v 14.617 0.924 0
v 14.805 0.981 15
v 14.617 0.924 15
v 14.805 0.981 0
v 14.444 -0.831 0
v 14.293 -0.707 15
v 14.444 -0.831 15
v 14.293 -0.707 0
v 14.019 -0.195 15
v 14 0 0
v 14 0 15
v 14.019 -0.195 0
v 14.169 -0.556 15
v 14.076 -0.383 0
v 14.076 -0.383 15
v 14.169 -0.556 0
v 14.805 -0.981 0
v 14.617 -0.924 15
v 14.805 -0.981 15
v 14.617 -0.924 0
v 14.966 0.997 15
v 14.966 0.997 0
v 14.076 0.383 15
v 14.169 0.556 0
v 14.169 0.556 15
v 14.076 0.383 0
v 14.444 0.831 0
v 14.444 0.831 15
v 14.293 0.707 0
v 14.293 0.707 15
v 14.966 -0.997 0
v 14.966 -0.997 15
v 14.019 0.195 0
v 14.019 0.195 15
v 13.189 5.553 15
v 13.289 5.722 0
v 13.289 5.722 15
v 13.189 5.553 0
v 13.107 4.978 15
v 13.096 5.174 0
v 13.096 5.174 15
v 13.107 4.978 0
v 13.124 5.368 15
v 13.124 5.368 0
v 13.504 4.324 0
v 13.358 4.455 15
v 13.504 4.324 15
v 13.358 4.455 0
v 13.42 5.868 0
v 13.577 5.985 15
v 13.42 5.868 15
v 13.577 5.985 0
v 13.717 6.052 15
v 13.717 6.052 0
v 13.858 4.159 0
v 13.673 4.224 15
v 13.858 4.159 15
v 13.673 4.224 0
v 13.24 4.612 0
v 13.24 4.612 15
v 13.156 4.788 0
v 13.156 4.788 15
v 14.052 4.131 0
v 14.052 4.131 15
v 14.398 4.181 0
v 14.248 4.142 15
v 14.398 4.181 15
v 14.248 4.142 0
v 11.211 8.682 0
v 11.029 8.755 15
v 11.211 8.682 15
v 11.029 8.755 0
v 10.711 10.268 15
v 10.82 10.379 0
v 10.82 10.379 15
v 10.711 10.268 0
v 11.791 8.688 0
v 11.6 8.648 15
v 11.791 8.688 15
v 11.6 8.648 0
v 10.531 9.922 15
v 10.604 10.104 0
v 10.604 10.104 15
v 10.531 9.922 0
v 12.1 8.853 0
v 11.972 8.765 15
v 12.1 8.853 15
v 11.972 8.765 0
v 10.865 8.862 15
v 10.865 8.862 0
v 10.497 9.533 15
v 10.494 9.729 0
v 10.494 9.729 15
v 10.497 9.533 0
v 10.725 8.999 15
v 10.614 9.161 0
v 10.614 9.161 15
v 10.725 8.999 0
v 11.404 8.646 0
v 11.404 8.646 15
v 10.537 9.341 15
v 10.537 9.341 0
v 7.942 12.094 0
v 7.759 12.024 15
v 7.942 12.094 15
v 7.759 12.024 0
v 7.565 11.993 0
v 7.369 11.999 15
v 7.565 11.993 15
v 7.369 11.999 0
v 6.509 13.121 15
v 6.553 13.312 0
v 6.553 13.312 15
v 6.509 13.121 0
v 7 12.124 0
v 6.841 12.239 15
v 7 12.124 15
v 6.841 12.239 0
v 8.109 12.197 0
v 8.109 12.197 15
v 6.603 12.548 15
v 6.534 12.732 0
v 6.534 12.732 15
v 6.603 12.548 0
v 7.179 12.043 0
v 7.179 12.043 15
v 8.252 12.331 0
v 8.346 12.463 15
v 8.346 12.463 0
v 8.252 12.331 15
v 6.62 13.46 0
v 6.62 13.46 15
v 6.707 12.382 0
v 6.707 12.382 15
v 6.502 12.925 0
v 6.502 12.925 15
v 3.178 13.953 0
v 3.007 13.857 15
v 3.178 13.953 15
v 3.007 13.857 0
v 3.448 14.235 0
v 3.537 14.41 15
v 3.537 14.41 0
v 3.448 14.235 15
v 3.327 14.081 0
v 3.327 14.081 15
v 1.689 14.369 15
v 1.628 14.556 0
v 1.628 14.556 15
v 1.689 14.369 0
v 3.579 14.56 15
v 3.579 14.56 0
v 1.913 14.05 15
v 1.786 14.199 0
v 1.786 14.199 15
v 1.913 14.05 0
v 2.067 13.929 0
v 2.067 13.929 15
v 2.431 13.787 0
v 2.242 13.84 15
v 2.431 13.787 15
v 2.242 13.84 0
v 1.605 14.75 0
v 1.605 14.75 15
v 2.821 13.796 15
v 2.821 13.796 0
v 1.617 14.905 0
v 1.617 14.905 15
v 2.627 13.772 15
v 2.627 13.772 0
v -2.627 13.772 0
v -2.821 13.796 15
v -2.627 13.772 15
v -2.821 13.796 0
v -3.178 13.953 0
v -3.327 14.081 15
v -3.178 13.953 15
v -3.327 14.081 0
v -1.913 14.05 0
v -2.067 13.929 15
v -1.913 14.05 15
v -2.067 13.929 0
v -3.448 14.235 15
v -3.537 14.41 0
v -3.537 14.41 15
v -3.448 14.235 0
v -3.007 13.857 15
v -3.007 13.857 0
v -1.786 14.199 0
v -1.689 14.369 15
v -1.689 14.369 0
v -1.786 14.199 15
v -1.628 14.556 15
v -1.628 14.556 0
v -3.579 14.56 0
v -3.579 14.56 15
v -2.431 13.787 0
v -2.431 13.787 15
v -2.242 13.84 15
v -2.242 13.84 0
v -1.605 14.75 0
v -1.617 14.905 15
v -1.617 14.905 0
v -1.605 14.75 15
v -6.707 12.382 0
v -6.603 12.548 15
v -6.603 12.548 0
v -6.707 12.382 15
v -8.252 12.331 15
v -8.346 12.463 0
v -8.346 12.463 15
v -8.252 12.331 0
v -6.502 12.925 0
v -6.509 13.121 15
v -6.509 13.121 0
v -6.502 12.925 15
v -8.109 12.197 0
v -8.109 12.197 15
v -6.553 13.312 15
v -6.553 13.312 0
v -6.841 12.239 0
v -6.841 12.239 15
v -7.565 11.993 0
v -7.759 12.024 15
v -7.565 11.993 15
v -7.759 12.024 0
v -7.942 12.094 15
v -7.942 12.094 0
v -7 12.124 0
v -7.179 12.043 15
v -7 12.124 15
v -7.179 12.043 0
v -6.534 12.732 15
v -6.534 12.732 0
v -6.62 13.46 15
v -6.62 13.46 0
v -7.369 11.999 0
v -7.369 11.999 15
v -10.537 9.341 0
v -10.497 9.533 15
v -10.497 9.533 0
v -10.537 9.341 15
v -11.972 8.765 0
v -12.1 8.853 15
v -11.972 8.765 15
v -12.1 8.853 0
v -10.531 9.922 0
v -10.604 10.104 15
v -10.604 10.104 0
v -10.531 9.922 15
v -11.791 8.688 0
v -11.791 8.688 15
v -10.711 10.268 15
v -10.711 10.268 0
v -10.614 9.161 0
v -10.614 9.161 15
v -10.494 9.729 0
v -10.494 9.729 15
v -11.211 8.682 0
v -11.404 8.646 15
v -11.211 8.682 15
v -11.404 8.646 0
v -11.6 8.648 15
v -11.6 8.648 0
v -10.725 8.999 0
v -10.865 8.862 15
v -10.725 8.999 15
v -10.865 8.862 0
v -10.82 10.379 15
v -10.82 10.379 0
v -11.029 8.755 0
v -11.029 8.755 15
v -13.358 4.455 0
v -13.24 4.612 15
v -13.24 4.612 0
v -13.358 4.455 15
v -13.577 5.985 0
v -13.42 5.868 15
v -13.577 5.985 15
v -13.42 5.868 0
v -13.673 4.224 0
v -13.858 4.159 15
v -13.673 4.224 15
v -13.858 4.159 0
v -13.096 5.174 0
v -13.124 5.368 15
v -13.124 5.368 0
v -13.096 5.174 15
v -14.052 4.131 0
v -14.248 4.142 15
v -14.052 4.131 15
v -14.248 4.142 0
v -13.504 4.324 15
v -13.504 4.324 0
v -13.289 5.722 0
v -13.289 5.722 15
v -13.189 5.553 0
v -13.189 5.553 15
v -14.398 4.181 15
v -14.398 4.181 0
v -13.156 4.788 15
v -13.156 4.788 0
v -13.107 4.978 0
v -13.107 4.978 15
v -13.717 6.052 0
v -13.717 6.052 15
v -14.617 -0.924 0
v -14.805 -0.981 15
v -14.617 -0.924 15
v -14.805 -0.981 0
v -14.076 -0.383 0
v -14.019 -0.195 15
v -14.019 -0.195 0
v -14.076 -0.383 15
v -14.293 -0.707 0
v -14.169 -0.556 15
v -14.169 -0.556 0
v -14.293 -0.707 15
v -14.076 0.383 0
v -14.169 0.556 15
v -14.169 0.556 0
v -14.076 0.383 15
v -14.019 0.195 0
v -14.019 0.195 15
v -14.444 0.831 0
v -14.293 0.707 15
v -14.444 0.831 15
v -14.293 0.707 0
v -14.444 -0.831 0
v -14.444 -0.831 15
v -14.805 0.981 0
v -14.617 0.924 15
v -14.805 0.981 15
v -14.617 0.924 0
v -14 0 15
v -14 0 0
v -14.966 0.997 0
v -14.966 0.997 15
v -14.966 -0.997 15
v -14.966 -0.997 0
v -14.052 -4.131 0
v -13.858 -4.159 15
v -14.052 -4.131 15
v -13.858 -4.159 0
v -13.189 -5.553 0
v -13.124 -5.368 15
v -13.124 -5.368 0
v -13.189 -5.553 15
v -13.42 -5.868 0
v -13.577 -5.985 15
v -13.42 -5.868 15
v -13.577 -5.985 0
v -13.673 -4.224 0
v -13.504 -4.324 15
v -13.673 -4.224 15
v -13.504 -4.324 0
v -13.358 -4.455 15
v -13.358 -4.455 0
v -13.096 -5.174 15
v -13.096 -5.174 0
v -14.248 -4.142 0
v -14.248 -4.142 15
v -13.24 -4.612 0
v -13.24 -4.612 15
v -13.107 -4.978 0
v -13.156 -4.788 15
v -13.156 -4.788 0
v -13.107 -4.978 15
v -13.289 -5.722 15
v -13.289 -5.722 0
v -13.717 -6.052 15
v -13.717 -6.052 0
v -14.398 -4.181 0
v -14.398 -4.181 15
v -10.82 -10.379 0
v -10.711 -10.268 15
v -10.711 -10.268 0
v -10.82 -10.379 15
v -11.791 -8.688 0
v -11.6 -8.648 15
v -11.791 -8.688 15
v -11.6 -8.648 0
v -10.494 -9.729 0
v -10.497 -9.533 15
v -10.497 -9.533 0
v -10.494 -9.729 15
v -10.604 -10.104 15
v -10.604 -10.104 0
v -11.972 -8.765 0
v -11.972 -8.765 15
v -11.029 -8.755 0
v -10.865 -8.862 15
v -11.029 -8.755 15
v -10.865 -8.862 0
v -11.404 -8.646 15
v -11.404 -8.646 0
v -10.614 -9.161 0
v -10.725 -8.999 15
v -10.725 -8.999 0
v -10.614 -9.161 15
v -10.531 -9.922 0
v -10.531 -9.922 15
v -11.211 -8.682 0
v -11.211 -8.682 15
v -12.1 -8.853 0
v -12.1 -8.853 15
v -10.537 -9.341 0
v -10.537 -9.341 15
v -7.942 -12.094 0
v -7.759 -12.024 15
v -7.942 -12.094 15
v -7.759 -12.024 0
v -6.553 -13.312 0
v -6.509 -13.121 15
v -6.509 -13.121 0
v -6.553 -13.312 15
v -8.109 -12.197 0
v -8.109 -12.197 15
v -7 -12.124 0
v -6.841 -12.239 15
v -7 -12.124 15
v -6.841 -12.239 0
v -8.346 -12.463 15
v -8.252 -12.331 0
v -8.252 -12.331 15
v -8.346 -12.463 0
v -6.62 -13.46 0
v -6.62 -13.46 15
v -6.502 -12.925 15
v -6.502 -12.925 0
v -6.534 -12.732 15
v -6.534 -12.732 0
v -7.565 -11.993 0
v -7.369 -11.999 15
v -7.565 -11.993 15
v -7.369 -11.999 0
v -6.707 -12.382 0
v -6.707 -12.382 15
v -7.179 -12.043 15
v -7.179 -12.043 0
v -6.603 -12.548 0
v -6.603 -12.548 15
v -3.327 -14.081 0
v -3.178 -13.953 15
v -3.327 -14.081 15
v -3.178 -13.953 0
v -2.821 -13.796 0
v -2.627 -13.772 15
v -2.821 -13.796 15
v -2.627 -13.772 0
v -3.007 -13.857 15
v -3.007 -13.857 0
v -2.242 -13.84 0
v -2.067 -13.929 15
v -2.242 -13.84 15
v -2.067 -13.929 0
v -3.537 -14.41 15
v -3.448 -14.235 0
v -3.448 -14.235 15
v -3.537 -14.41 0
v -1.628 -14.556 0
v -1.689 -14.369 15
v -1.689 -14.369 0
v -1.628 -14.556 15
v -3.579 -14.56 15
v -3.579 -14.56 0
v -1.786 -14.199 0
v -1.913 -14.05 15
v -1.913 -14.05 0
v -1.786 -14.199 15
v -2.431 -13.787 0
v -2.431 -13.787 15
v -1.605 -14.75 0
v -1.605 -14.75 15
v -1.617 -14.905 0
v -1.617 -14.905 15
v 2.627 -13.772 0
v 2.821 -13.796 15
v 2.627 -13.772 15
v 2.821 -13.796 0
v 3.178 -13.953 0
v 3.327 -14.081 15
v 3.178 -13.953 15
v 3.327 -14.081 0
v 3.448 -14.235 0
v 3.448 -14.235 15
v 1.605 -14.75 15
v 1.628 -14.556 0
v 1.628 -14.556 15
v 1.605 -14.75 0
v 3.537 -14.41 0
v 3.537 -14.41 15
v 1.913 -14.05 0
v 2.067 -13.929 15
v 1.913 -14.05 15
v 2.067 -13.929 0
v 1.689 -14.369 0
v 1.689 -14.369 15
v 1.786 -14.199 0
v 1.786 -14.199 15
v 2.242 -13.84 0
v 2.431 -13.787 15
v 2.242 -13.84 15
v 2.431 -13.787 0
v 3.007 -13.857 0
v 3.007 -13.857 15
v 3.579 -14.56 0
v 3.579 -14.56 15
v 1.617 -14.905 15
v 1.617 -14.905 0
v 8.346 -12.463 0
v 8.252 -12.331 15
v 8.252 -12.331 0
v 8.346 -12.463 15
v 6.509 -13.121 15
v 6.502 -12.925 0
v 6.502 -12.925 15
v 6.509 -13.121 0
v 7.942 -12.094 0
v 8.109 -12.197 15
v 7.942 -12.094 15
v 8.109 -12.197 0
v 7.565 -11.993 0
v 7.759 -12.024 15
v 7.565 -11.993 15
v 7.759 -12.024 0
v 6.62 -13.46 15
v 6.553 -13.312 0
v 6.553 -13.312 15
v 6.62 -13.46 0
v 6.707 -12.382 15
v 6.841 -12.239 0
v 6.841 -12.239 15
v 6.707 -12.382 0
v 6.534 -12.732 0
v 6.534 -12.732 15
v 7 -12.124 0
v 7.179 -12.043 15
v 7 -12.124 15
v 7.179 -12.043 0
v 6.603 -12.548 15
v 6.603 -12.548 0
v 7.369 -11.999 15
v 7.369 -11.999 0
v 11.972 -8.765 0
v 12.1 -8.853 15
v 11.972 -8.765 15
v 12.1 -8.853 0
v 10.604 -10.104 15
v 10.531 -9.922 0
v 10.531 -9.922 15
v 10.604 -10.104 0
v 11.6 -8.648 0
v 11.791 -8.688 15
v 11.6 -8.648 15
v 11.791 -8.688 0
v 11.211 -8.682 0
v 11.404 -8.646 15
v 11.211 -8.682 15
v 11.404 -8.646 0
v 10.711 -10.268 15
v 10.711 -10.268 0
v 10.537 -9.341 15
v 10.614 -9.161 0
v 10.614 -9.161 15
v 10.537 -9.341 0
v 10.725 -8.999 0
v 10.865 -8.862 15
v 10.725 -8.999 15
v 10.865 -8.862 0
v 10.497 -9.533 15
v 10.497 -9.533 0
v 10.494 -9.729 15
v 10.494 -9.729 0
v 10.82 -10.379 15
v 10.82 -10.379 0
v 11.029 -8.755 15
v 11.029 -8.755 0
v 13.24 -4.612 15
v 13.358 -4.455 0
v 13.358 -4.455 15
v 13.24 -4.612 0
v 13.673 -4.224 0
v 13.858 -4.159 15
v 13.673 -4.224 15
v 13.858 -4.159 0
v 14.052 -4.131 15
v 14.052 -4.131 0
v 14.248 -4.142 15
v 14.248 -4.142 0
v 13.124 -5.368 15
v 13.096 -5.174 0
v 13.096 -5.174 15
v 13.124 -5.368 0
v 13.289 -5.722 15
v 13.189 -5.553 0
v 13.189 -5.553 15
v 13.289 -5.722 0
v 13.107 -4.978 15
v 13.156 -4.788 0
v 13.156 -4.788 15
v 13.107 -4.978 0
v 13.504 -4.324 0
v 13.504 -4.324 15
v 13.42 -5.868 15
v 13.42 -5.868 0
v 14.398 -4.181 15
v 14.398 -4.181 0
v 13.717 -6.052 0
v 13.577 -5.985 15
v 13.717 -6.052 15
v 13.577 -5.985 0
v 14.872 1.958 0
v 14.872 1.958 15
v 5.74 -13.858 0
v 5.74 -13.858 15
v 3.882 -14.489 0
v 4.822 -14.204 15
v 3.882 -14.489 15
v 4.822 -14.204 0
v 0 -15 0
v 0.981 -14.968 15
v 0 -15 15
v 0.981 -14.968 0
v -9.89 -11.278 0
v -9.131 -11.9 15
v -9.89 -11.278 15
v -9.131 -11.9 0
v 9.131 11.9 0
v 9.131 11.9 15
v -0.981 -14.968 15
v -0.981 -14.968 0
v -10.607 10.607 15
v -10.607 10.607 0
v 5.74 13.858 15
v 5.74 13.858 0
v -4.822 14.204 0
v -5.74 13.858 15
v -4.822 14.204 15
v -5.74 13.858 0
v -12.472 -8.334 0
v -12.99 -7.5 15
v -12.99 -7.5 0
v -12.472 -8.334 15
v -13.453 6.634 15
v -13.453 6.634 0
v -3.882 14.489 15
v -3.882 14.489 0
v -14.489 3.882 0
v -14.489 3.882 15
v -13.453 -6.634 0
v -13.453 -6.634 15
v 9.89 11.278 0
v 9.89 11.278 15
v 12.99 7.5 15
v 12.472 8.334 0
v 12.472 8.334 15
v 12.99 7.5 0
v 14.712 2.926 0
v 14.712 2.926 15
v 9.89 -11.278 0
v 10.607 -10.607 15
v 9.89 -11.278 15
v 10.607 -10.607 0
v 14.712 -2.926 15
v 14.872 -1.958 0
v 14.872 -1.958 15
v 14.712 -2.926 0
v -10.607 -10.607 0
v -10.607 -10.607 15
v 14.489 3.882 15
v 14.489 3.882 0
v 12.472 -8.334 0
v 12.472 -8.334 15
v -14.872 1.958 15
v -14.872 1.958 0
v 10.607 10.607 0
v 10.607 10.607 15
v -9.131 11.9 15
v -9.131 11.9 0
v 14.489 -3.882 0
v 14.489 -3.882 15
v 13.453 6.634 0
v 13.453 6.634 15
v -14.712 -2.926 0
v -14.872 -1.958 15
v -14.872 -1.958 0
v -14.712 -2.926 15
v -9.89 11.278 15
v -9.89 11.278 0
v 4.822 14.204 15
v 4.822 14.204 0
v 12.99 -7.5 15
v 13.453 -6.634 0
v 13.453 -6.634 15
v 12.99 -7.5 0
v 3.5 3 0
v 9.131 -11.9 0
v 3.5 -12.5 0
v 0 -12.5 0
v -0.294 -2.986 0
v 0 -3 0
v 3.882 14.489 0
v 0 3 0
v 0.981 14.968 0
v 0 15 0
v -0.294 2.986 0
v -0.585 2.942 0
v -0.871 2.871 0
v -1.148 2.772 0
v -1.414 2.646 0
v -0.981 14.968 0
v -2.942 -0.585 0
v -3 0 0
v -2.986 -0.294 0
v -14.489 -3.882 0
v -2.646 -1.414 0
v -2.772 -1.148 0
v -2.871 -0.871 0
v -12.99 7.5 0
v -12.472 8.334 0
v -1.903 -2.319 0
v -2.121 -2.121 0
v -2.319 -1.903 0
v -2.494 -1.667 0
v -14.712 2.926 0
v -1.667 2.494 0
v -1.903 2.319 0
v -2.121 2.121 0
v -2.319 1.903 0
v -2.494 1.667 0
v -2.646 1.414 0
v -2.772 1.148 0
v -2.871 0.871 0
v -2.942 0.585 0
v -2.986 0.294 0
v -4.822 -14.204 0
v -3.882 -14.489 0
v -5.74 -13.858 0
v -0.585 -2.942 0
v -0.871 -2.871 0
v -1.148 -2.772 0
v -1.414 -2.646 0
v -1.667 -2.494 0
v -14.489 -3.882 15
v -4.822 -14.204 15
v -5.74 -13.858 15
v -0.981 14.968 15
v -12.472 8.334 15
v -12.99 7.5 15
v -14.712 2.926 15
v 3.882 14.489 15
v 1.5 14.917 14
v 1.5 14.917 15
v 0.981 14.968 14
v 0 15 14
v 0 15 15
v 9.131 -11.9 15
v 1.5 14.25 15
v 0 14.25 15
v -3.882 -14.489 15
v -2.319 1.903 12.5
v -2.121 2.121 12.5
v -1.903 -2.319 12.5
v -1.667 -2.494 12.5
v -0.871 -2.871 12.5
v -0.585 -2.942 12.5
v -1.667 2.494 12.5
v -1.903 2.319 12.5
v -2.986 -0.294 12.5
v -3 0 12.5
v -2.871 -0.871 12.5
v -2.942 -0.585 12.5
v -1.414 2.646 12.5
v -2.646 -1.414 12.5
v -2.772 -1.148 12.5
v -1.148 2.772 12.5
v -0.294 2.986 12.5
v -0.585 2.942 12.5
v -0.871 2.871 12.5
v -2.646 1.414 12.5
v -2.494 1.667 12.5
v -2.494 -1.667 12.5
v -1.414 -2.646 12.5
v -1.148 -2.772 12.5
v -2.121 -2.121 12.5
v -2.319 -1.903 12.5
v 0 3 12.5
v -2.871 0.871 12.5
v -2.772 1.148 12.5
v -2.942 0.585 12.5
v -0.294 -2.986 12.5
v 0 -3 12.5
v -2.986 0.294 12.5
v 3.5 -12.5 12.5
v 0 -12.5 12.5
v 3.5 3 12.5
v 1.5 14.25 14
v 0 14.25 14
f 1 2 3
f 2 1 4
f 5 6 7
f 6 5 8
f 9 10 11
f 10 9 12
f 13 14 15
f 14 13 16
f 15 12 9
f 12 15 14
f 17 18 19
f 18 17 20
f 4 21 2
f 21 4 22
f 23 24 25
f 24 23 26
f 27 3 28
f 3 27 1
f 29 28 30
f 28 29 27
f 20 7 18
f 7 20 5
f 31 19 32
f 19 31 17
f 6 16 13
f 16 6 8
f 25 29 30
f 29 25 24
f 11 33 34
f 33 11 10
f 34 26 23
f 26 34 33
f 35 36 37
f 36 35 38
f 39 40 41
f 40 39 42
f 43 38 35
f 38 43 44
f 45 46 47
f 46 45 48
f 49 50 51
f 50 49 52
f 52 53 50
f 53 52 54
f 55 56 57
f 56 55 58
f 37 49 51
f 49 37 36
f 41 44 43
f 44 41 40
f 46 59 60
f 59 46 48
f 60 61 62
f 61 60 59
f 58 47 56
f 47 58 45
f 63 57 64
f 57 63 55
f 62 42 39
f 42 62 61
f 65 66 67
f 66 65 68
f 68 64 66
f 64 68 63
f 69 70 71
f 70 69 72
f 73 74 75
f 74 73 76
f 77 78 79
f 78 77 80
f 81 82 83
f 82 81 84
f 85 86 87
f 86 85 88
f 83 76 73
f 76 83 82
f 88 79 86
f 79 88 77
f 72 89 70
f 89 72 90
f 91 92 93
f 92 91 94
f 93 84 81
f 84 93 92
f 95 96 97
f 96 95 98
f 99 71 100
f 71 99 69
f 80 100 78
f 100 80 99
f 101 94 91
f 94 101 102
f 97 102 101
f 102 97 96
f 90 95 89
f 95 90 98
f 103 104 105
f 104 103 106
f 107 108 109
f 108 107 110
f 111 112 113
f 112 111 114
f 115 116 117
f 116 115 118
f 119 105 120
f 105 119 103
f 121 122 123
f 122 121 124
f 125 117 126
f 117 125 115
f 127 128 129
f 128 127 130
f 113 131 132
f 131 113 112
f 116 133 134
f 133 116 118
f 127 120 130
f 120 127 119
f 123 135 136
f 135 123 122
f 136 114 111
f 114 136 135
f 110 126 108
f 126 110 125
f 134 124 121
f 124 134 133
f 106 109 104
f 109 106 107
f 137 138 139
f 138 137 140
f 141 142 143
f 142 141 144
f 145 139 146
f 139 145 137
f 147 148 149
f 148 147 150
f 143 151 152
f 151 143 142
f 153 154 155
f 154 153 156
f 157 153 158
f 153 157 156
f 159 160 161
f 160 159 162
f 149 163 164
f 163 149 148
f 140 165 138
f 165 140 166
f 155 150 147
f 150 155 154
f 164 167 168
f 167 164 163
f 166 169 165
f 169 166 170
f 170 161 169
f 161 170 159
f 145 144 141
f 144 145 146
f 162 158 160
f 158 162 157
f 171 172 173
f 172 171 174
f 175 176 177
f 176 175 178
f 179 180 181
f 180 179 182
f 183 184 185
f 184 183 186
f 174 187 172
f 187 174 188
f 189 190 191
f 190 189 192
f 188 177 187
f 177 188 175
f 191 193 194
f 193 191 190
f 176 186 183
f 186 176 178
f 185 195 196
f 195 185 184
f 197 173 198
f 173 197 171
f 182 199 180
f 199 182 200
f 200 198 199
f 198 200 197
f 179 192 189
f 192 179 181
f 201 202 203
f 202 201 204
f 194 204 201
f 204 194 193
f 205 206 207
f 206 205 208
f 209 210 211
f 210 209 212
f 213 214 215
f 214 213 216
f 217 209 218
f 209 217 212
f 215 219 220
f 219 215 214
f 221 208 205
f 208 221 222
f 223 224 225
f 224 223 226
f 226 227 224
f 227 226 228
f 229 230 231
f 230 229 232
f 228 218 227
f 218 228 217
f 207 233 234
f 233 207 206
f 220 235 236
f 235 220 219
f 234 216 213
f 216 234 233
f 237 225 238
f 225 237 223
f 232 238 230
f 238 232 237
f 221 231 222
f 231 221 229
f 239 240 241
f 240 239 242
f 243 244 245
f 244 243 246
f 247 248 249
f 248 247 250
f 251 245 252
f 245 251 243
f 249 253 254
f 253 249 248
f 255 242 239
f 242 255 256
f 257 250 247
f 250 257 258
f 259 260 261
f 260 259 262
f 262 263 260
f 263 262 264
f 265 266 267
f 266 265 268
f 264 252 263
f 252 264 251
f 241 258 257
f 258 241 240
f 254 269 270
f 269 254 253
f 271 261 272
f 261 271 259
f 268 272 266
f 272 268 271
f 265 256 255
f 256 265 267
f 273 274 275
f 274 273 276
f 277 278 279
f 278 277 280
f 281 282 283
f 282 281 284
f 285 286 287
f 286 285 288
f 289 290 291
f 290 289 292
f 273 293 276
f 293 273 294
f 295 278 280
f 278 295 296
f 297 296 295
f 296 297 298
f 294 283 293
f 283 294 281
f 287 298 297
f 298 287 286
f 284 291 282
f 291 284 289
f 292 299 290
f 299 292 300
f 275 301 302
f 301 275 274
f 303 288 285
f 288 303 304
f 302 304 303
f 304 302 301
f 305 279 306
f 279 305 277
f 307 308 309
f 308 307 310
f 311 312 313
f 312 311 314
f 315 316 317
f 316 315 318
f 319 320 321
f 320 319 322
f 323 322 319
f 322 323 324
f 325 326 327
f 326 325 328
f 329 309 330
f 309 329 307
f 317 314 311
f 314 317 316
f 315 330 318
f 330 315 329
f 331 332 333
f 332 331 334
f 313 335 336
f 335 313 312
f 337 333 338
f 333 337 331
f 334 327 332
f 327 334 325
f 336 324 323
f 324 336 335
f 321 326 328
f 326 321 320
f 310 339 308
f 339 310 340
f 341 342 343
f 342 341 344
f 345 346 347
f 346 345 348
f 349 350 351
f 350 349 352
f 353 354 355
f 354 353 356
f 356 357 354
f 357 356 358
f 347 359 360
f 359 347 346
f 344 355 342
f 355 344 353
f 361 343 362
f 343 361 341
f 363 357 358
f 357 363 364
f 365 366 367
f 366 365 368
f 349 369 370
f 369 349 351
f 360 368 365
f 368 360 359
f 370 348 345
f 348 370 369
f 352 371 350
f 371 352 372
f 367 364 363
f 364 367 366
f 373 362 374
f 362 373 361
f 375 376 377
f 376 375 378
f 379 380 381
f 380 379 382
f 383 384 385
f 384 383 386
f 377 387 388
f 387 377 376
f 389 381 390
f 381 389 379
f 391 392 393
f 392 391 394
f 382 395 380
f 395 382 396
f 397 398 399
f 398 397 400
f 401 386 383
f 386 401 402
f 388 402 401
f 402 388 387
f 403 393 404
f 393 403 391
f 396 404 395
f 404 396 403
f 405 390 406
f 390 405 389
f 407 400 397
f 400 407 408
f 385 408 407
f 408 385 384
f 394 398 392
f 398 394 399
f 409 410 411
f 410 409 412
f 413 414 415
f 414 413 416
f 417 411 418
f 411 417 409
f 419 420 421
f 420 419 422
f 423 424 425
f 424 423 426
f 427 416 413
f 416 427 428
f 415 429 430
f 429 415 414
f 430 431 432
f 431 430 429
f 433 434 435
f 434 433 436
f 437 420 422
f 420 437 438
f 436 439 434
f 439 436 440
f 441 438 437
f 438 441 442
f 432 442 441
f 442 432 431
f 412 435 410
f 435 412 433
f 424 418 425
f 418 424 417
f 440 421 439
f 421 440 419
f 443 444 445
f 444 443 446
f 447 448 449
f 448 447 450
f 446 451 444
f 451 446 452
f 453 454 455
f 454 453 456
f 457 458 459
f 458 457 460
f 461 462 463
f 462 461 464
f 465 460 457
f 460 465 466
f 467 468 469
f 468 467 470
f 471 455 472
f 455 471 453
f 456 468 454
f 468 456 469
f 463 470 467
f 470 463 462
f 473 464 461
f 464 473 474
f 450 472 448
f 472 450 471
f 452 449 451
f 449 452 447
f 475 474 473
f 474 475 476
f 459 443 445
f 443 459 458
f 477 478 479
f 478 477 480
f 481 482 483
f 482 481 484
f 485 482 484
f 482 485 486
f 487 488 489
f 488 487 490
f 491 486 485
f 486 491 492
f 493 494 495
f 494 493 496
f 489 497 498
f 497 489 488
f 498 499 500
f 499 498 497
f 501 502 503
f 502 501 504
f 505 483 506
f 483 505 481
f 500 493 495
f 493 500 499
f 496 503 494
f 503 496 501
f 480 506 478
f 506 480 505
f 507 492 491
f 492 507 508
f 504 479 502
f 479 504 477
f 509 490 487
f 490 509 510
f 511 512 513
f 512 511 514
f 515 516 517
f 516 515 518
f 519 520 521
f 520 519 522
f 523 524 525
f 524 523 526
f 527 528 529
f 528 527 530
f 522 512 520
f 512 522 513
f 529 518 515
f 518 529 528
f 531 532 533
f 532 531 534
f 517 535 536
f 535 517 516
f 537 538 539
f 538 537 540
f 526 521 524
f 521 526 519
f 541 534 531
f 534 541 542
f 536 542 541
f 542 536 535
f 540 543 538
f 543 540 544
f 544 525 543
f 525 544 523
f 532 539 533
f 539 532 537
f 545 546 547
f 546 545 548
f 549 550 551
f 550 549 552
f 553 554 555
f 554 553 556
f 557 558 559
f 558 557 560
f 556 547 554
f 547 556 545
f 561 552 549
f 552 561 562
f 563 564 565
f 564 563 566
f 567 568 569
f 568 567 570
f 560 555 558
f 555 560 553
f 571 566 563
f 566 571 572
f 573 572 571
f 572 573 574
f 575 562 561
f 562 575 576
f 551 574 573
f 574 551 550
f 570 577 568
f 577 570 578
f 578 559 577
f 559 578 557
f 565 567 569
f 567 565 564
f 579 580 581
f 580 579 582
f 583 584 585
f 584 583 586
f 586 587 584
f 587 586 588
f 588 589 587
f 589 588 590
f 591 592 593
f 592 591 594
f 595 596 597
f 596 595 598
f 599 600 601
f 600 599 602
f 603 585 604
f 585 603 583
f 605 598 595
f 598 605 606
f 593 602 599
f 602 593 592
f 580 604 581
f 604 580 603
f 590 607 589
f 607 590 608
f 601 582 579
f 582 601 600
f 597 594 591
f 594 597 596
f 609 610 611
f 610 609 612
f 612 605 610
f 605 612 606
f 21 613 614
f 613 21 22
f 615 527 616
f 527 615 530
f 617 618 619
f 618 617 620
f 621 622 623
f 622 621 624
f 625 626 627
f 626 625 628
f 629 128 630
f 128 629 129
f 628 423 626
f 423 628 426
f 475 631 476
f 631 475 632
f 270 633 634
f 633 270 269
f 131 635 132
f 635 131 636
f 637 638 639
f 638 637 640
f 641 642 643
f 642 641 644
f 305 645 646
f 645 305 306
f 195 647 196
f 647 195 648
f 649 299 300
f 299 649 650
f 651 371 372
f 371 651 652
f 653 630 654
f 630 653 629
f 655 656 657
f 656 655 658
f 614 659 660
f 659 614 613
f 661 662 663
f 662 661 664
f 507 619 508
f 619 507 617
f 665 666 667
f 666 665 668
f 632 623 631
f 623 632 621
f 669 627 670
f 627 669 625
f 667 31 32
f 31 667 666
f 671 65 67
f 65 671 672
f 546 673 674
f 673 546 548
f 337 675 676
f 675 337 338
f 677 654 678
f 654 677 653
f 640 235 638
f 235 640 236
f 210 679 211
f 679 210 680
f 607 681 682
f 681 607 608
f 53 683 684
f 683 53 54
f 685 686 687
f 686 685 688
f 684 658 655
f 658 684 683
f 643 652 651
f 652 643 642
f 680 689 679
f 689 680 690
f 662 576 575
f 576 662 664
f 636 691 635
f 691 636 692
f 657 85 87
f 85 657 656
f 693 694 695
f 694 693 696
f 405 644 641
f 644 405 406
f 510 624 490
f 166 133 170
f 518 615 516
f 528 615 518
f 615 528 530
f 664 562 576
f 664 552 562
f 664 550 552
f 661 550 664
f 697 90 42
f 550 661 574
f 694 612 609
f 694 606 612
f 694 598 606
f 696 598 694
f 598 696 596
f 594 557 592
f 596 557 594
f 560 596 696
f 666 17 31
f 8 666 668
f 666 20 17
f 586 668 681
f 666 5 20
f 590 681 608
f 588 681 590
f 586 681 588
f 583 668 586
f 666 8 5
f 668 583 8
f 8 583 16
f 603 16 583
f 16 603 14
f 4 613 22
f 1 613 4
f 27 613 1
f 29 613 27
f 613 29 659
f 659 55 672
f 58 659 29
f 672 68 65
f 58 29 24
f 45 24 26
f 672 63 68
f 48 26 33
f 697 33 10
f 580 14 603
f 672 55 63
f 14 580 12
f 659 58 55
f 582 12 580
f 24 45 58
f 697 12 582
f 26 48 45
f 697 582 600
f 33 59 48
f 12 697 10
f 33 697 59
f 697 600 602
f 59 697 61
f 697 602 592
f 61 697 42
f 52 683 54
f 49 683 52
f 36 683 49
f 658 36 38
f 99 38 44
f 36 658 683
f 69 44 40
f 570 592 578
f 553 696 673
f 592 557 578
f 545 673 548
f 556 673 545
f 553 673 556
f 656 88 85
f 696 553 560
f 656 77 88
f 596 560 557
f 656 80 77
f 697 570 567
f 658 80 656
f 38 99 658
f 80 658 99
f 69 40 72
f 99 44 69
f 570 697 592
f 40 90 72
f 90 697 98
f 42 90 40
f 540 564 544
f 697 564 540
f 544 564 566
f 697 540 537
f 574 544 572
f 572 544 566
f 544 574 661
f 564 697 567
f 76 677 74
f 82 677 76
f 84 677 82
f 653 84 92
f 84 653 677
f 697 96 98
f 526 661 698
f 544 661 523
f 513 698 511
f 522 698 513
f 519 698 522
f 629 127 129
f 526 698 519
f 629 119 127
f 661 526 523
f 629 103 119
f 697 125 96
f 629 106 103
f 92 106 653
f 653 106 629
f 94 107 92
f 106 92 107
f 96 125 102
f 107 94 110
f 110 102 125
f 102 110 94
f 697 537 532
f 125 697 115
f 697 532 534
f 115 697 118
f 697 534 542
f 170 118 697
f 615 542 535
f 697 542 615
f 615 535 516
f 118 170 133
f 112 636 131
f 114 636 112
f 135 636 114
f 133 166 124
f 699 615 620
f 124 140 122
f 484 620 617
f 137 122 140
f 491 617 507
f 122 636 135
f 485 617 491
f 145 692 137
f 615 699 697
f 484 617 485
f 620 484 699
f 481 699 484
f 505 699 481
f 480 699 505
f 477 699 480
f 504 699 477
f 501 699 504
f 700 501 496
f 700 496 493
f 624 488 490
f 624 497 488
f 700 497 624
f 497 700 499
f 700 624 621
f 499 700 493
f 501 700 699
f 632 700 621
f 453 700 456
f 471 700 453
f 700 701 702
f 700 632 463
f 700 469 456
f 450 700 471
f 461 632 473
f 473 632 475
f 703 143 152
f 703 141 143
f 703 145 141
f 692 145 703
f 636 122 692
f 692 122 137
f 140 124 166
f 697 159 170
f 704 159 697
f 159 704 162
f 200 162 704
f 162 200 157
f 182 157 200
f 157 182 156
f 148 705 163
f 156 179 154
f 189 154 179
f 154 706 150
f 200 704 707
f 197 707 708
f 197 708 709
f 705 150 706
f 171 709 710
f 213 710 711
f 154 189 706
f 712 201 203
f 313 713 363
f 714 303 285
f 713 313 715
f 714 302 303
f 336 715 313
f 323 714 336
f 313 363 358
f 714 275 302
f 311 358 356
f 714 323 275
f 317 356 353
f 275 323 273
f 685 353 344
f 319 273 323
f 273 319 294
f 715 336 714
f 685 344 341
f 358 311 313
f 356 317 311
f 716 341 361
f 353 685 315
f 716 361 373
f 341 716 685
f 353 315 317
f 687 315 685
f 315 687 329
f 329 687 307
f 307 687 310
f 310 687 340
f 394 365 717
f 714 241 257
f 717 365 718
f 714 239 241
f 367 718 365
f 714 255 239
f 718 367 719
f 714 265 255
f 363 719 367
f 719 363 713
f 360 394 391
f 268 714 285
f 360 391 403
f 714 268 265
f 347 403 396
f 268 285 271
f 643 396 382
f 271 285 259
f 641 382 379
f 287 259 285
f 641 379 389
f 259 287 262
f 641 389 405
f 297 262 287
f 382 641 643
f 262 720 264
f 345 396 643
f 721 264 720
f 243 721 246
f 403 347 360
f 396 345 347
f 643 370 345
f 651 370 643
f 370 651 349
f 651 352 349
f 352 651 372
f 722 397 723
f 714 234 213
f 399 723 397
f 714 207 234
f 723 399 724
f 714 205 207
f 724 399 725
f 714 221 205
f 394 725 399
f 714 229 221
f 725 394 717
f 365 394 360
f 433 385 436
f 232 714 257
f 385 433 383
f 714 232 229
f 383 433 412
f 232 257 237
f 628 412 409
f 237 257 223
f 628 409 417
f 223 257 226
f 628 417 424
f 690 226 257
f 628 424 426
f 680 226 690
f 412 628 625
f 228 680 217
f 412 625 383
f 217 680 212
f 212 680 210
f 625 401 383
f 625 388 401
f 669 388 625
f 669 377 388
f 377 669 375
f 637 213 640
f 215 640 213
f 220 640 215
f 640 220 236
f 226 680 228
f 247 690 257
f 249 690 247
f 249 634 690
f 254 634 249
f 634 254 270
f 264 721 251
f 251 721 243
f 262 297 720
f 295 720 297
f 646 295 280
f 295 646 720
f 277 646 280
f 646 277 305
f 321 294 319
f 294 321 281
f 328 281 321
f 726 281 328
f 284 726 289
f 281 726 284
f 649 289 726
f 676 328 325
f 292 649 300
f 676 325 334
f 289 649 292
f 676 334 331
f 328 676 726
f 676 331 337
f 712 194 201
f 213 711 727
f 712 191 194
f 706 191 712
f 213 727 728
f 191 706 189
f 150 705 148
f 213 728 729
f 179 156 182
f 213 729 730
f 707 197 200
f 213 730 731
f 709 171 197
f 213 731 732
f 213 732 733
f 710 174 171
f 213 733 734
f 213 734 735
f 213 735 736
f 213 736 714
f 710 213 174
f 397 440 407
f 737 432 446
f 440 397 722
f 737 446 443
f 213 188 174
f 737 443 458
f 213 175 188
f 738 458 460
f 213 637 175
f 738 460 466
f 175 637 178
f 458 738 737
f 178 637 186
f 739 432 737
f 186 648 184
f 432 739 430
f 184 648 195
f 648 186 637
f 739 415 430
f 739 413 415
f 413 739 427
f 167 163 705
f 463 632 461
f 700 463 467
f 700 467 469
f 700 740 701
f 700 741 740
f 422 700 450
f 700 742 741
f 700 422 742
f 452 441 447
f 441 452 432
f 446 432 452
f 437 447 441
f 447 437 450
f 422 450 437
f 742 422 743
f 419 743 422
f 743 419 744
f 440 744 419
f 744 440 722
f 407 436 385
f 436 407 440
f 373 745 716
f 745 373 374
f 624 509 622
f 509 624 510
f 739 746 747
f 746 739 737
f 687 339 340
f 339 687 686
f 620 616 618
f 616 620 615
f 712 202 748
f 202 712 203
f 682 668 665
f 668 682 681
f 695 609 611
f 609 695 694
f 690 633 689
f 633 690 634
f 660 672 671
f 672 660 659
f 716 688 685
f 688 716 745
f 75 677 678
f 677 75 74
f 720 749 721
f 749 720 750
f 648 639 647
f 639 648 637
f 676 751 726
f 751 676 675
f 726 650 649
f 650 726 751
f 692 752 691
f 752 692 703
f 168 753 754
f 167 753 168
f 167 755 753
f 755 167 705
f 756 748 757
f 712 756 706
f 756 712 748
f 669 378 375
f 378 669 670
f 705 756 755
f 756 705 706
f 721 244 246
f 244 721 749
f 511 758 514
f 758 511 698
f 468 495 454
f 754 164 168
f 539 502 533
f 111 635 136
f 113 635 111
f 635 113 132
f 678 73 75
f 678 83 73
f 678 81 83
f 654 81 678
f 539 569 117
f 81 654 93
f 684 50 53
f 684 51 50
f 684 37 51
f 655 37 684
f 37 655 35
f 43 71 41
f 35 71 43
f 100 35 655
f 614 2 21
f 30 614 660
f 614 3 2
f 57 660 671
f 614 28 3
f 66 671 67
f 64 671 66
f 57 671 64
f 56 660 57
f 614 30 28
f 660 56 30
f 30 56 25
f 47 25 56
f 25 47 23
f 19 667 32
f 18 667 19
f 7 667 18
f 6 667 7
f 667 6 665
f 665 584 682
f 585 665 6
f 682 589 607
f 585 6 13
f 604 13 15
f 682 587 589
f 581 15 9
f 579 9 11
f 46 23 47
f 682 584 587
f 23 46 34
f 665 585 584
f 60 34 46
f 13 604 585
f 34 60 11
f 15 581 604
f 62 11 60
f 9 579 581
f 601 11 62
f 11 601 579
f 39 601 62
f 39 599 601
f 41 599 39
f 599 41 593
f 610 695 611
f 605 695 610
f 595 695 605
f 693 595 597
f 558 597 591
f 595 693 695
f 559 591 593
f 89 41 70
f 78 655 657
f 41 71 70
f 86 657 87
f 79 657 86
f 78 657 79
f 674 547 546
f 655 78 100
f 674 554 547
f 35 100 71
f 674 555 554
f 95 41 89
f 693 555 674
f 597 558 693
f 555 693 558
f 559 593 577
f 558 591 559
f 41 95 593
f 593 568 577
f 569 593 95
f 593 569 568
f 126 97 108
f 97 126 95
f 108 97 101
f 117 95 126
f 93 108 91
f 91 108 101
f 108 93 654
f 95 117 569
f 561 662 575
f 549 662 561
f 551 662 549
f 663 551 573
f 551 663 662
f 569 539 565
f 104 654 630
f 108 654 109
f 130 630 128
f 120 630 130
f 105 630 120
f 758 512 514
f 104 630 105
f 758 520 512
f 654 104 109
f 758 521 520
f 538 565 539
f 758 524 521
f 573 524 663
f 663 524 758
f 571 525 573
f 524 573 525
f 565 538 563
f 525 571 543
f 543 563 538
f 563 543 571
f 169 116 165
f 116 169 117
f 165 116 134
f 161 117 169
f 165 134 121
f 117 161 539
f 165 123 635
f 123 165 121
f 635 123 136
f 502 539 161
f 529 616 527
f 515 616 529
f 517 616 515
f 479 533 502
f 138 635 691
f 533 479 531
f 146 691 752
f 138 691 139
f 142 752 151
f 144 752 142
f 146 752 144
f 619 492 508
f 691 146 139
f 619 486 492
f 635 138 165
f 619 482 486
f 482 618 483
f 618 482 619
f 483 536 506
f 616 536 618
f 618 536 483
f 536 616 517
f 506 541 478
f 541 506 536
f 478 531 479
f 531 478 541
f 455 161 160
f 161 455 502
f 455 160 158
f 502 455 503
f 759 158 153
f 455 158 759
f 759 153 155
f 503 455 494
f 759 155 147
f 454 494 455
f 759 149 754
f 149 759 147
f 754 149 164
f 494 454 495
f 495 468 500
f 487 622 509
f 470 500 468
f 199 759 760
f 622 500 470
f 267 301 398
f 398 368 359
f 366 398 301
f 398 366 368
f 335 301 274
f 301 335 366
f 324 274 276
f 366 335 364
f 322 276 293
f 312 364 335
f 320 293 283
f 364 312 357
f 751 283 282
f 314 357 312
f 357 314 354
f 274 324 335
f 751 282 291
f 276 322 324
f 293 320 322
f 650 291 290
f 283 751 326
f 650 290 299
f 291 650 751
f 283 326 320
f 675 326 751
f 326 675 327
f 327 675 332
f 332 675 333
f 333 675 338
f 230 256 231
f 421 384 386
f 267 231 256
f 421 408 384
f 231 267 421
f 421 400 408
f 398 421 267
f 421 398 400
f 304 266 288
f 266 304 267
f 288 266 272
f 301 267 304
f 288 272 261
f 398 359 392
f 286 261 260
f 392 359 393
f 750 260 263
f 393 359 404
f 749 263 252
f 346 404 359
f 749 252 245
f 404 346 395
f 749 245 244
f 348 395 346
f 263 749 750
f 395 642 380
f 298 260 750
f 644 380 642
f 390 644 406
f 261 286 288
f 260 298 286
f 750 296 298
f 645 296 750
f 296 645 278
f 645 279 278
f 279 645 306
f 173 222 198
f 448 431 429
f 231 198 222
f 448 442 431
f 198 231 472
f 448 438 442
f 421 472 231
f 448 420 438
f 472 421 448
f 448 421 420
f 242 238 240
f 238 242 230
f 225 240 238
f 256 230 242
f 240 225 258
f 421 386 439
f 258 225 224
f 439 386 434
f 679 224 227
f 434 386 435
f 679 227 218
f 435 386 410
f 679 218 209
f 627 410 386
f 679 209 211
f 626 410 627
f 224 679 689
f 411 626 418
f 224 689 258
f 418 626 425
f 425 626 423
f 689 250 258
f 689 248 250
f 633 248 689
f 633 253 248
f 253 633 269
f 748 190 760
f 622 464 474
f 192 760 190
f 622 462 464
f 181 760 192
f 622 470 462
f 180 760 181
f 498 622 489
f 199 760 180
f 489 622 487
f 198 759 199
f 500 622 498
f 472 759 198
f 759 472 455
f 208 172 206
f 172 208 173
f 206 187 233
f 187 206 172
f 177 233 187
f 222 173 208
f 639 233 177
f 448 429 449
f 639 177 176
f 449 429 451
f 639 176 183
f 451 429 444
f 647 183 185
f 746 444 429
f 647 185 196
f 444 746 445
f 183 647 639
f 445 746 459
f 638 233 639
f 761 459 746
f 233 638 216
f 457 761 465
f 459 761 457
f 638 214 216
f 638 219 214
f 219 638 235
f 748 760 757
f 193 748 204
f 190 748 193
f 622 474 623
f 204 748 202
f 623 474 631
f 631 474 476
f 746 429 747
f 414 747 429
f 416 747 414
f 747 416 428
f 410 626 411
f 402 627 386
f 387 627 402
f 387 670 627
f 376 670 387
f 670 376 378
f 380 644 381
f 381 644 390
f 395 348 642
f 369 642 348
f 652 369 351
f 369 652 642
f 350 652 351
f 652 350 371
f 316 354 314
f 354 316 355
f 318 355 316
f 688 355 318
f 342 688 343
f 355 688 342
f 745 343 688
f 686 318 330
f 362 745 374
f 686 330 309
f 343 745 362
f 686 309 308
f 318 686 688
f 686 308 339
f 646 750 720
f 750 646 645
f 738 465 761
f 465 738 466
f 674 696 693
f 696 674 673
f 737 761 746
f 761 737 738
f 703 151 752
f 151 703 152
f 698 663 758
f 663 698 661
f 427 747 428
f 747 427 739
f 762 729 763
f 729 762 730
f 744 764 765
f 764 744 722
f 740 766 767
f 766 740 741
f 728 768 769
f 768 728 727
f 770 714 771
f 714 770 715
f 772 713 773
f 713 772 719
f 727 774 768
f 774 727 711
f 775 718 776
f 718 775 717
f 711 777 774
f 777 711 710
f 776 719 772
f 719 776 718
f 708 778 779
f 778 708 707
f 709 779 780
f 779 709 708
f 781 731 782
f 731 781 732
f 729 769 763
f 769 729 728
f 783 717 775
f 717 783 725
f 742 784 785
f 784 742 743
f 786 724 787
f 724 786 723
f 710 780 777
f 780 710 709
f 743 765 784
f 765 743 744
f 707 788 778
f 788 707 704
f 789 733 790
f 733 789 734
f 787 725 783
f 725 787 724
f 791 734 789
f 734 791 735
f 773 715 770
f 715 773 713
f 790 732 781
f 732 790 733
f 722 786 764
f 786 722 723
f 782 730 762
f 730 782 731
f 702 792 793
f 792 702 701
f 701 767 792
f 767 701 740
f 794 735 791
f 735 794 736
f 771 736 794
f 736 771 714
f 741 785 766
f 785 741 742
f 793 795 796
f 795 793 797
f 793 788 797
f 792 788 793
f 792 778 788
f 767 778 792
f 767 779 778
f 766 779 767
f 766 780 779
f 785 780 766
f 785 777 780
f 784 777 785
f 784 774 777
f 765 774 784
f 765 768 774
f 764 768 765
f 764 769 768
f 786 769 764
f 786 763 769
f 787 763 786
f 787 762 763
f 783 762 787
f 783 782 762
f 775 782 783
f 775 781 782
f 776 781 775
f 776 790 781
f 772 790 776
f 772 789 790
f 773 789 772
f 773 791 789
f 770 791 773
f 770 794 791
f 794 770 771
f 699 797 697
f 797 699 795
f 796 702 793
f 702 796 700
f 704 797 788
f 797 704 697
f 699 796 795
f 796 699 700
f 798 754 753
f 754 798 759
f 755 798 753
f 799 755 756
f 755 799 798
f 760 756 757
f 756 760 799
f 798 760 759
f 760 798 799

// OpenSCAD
// Replacement knob for hotplate stirrer with D-shaft
// Print orientation: flat side of D bore faces the hotplate (z = 0)

// ---------------- Parameters ----------------
knob_d        = 30;    // knob outer diameter
knob_h        = 15;    // knob height
shaft_d       = 6;     // D-bore diameter (shaft clearance)
bore_depth    = 12;    // D-bore depth from bottom face
groove_count  = 18;    // number of vertical grip grooves
groove_d      = 2;     // groove diameter (half-cylinder)
pointer_w     = 1.5;   // pointer groove width
pointer_d     = 1;     // pointer groove depth
eps           = 0.5;   // overcut for clean boolean differences

$fn = 96;

// Derived
outer_r = knob_d / 2;
// Check: distance from flat to opposite side of D = bore_depth - shaft_d/2
// (included for the user's reference: 12 - 3 = 9 mm)

// ---------------- Model ----------------
difference() {
    // Main body
    cylinder(d = knob_d, h = knob_h);

    // D-shaped blind bore from bottom face
    translate([0, 0, -eps])
        cylinder(d = shaft_d, h = bore_depth + 2 * eps, $fn = 64);
    // Flat side of the D, centred on the -Y axis
    translate([0, -bore_depth - eps, -eps])
        cube([shaft_d / 2 + eps, outer_r + eps, bore_depth + 2 * eps]);

    // Vertical grip grooves along the full height
    for (i = [0 : groove_count - 1])
        rotate([0, 0, i * 360 / groove_count])
            translate([outer_r, 0, -eps])
                cylinder(d = groove_d, h = knob_h + 2 * eps, $fn = 32);

    // Pointer groove on the top face, centred on the +Y axis
    translate([0, outer_r - pointer_w / 2, knob_h - pointer_d])
        cube([pointer_w, pointer_w, pointer_d + eps]);
}
